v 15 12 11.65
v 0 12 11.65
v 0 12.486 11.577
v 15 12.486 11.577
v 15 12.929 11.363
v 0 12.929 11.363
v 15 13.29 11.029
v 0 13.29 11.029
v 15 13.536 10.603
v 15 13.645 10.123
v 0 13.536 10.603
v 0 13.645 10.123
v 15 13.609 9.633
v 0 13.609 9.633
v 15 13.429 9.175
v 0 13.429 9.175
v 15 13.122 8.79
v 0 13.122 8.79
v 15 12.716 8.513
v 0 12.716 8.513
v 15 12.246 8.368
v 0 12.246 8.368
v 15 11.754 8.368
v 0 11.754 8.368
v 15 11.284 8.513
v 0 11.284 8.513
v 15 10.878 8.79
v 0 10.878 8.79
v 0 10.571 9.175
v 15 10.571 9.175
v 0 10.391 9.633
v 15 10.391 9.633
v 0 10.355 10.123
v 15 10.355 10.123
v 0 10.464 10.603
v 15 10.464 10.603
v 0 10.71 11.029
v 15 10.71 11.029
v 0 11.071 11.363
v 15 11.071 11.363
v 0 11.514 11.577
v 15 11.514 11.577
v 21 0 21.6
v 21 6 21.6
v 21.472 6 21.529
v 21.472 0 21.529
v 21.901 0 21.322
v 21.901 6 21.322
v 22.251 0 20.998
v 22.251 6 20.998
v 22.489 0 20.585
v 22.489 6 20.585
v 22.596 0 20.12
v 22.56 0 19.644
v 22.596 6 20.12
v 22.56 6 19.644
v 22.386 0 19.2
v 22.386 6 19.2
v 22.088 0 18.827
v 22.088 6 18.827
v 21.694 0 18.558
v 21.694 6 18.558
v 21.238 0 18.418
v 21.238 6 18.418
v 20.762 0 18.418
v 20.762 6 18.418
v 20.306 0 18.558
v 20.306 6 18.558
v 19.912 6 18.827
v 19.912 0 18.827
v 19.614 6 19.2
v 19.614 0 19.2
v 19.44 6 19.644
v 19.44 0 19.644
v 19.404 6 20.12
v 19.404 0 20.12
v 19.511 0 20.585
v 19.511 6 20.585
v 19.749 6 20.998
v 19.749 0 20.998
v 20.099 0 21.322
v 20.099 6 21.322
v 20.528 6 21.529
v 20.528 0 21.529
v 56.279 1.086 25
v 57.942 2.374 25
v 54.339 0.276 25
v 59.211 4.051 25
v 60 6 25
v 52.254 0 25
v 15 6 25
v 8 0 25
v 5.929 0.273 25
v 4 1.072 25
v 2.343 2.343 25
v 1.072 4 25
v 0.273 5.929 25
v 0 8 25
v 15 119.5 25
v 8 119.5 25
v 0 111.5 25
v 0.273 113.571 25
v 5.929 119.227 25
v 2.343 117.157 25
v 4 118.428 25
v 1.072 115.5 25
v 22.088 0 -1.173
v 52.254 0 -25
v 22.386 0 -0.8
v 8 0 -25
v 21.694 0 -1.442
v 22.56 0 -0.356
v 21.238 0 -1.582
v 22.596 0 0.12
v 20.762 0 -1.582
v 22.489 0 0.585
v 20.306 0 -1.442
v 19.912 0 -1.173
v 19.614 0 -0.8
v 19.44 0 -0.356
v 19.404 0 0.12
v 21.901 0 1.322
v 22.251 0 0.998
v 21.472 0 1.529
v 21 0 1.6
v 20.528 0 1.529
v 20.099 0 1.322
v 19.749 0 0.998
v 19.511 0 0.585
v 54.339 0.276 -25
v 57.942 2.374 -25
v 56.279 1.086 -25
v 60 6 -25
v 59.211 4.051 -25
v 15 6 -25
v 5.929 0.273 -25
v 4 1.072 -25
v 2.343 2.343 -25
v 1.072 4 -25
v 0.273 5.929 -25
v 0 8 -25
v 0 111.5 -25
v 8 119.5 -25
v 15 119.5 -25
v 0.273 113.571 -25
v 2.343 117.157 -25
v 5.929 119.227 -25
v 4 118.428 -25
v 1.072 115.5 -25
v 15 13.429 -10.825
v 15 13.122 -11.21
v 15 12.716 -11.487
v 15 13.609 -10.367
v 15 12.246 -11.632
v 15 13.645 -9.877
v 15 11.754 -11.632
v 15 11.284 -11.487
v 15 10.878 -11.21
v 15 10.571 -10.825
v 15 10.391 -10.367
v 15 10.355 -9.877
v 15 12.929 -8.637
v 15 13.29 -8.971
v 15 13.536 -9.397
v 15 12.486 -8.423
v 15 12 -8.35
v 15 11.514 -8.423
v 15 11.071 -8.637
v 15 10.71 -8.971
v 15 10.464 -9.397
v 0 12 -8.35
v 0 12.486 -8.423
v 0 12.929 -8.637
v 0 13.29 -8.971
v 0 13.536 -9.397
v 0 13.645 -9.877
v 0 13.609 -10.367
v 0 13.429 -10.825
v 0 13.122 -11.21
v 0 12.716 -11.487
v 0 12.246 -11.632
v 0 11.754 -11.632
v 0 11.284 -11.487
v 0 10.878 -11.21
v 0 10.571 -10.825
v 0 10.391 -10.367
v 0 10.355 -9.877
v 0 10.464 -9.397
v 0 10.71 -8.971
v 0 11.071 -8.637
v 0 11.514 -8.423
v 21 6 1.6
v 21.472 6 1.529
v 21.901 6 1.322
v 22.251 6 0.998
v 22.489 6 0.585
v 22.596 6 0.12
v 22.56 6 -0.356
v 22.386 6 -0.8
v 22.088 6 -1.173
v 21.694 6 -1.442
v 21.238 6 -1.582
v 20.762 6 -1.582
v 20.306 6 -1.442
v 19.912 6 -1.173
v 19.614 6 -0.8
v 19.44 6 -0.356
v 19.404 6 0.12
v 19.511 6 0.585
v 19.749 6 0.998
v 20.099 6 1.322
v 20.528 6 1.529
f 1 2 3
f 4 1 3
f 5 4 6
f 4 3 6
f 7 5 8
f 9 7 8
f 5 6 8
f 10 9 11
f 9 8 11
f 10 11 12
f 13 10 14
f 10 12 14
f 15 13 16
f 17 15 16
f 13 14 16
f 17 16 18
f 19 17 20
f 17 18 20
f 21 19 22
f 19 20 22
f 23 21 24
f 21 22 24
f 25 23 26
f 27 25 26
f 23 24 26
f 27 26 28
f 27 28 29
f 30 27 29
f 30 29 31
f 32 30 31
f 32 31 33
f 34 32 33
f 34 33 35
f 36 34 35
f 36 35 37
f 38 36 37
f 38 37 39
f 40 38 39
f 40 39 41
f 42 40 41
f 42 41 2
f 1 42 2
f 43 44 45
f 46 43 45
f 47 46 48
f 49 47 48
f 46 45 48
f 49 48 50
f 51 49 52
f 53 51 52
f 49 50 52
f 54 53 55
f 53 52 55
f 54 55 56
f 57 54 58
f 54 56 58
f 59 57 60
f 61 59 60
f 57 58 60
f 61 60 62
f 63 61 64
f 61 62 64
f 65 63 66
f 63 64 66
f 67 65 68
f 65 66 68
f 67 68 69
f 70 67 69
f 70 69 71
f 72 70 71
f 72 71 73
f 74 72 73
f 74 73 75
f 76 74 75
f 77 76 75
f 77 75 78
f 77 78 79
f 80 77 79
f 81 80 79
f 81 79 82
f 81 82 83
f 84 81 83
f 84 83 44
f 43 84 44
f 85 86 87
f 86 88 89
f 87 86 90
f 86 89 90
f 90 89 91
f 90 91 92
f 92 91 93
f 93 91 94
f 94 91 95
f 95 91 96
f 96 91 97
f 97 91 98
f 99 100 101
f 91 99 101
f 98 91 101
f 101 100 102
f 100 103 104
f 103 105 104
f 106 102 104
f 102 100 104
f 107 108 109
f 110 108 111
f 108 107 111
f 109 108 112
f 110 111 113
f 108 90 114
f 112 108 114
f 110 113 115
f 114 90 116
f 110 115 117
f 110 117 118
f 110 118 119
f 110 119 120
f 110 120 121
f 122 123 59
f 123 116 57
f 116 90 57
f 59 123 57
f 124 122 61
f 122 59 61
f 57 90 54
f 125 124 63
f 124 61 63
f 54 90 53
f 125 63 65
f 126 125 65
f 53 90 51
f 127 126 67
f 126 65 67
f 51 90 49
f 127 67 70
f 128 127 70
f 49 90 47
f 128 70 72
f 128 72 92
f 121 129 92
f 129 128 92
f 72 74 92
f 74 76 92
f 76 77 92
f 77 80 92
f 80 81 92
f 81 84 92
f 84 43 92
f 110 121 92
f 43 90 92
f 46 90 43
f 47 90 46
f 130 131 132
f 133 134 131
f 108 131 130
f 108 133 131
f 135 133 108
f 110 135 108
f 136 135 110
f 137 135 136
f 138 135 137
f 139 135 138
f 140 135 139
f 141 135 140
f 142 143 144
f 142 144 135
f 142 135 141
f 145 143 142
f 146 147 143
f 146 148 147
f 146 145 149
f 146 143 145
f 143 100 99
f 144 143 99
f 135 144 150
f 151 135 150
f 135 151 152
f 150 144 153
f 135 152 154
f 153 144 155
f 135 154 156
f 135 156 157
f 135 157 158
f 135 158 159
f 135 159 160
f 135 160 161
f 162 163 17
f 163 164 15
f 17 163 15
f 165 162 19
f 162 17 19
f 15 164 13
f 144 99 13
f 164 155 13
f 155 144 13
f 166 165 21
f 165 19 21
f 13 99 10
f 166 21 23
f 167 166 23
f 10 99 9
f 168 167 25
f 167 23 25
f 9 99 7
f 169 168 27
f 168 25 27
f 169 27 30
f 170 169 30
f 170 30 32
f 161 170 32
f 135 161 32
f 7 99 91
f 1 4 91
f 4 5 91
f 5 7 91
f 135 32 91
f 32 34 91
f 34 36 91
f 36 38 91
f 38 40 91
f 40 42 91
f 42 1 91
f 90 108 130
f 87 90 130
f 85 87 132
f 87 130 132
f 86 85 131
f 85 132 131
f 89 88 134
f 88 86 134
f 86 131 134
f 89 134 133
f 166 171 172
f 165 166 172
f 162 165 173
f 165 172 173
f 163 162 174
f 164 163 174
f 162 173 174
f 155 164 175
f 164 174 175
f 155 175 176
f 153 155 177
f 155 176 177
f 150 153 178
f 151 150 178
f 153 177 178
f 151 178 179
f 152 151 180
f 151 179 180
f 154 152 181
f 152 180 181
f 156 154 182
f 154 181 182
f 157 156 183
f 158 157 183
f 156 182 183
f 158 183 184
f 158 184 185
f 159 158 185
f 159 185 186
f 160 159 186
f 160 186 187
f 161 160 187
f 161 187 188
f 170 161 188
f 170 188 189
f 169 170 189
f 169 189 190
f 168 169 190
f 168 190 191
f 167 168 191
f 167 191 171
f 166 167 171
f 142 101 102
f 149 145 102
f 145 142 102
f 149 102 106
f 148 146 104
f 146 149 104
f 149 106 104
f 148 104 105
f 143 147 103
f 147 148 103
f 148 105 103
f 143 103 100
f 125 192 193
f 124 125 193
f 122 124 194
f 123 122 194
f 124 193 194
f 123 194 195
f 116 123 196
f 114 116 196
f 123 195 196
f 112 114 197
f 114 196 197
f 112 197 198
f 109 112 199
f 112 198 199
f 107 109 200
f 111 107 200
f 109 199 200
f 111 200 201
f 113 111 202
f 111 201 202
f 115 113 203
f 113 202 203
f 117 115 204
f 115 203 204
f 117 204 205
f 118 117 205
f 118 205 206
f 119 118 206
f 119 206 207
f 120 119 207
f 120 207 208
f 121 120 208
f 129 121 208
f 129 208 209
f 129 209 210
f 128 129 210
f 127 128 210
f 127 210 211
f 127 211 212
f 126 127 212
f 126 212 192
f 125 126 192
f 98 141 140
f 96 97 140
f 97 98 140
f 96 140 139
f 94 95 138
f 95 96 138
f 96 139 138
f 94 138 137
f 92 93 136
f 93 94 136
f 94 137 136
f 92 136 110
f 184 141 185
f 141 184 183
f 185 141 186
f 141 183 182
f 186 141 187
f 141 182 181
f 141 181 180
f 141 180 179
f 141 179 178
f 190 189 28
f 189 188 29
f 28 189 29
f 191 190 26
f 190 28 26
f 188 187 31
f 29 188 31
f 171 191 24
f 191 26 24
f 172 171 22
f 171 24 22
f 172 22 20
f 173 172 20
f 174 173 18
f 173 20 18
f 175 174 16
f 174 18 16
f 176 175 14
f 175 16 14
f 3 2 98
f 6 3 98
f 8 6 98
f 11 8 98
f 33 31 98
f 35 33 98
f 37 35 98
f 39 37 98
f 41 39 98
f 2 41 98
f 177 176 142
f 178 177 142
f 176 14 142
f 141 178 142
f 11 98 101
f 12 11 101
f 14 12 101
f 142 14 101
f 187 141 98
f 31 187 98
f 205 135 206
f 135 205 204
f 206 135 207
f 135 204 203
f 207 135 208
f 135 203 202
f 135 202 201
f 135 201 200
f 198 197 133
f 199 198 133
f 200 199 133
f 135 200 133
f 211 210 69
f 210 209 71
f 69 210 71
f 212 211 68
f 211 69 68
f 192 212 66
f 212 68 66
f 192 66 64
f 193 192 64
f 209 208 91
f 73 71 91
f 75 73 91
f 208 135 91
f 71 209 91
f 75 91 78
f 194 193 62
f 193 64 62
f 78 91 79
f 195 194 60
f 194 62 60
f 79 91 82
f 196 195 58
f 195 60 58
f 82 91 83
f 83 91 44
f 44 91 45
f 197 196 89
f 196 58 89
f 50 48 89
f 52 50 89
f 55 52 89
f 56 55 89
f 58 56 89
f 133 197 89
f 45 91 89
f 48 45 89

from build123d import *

# Parameters (mm, degrees)
EXTRUDE_1_DEPTH     = 25
FILLET_1_R          = 8
SKETCH_2_R          = 1.65
CUT_EXTRUDE_1_DEPTH = 137.034003102
SKETCH_3_R          = 1.6
CUT_EXTRUDE_2_DEPTH = 131.794686436


with BuildPart() as part:
    # 草图1 → 凸台-拉伸1 (new, symmetric)
    with BuildSketch(Plane.XY):
        Polygon((0, 0), (0, 119.5), (15, 119.5), (15, 6), (60, 6), (60, 0), align=None)
    extrude(amount=EXTRUDE_1_DEPTH, both=True)

    # 圆角1
    # the kernel refuses this fillet: 8 mm, written as the material it takes off along each edge
    with BuildSketch(Plane(origin=(0, 119.5, 45), x_dir=(0, -1, 0), z_dir=(0, 0, -1)), Plane(origin=(0, 0, -45), x_dir=(0, 1, 0), z_dir=(0, 0, 1))) as fillet_1_piece_1:
        with BuildLine():
            CenterArc((FILLET_1_R, -FILLET_1_R), FILLET_1_R, 90, 90)
            Line((0, -FILLET_1_R), (-FILLET_1_R * 0.02, -FILLET_1_R))
            Line((-FILLET_1_R * 0.02, -FILLET_1_R), (-FILLET_1_R * 0.02, FILLET_1_R * 0.02))
            Line((-FILLET_1_R * 0.02, FILLET_1_R * 0.02), (FILLET_1_R, FILLET_1_R * 0.02))
            Line((FILLET_1_R, FILLET_1_R * 0.02), (FILLET_1_R, 0))
        make_face()
    extrude(amount=90, mode=Mode.SUBTRACT)
    with BuildSketch(Plane(origin=(60, 0, -44.364916731), x_dir=(0, 1, 0), z_dir=(0, 0, 1))) as fillet_1_piece_2:
        with BuildLine():
            CenterArc((8, 7.745966692), FILLET_1_R, 180, 75.522487814)
            Line((0, 7.745966692), (-0.16, 7.745966692))
            Line((-0.16, 7.745966692), (-0.16, 0))
            Line((-0.16, 0), (0, -0.16))
            ThreePointArc((0, -0.16), (3, -0.16), (5.96, -0.154919334))
            Line((5.96, -0.154919334), (6, 0))
        make_face()
    extrude(amount=88.729833462, mode=Mode.SUBTRACT)

    # 草图2 → 切除-拉伸1 (cut, through all)
    with BuildSketch(Plane.ZY):
        with Locations((10, 12)):
            Circle(SKETCH_2_R)
        with Locations((-10, 12)):
            Circle(SKETCH_2_R)
    extrude(amount=-CUT_EXTRUDE_1_DEPTH, mode=Mode.SUBTRACT)

    # 草图3 → 切除-拉伸2 (cut, through all)
    with BuildSketch(Plane(origin=(0, 6, 0), x_dir=(1, 0, 0), z_dir=(0, 1, 0))):
        with Locations(Location((21, -20, 0), (0, 0, 270))):
            Circle(SKETCH_3_R)
        with Locations(Location((21, 0, 0), (0, 0, 270))):
            Circle(SKETCH_3_R)
    extrude(amount=-CUT_EXTRUDE_2_DEPTH, mode=Mode.SUBTRACT)


solid = part.part
